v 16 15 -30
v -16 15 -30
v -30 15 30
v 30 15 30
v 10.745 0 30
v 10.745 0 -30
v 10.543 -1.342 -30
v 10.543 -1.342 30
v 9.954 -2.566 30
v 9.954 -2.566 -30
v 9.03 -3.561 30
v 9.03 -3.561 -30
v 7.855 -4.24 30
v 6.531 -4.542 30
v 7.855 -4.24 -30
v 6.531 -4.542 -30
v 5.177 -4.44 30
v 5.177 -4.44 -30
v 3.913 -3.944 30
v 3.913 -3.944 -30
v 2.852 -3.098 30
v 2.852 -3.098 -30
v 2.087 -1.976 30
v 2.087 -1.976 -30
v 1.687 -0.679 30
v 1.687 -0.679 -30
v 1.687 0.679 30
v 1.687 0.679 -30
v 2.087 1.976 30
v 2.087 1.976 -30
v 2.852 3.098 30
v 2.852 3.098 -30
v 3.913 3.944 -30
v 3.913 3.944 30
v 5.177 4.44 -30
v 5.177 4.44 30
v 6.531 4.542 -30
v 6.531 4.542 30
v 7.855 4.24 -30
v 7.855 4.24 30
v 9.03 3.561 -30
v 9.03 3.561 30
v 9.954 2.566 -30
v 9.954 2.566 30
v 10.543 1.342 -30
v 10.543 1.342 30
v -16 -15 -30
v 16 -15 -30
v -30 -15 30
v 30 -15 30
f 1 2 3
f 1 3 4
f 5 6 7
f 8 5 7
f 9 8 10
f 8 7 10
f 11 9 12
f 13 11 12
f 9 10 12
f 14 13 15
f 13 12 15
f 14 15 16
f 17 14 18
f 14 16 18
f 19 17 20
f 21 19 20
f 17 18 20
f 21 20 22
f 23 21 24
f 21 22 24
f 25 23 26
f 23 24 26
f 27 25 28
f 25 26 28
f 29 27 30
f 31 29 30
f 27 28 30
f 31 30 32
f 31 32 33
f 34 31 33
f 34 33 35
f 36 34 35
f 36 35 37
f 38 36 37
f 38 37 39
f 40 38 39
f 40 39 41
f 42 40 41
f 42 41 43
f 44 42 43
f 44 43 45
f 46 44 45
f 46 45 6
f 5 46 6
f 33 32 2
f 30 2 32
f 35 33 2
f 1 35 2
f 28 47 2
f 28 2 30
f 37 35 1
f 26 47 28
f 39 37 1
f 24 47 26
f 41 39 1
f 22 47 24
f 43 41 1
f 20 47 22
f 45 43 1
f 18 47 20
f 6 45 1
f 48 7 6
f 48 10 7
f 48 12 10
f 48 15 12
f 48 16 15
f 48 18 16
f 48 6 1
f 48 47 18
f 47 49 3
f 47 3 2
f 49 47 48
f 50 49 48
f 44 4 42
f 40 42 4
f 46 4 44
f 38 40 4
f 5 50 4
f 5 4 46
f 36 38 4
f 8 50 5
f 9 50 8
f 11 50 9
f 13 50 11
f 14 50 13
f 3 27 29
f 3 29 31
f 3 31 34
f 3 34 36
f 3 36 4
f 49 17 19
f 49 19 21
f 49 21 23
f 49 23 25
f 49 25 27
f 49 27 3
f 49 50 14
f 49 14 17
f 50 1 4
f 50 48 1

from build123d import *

# Parameters (mm, degrees)
F1_DEPTH      = 15
F1_DEPTH_BACK = 15
F2_R          = 4.554576
F3_DEPTH      = 65.6


with BuildPart() as f1:
    # F0 (on Front) → F1 (new body, two sides)
    with BuildSketch(Plane.XZ) as f1_sk:
        Polygon((30, 30), (-14.883985, 30), (-1.883985, -30), (16, -30), align=None)
        Polygon((-14.883985, 30), (-25.116015, 30), (-12.116015, -30), (-1.883985, -30), align=None)
        Polygon((-25.116015, 30), (-30, 30), (-16, -30), (-12.116015, -30), align=None)
    extrude(amount=F1_DEPTH)
    extrude(f1_sk.sketch, amount=-F1_DEPTH_BACK)

    # F2 (on face) → F3 (cut)
    with BuildSketch(Plane(origin=(0, 0, -30), x_dir=(1, 0, 0), z_dir=(0, 0, -1))):
        with Locations((6.190634, 0)):
            Circle(F2_R)
    extrude(amount=-F3_DEPTH, mode=Mode.SUBTRACT)


solid = f1.part
